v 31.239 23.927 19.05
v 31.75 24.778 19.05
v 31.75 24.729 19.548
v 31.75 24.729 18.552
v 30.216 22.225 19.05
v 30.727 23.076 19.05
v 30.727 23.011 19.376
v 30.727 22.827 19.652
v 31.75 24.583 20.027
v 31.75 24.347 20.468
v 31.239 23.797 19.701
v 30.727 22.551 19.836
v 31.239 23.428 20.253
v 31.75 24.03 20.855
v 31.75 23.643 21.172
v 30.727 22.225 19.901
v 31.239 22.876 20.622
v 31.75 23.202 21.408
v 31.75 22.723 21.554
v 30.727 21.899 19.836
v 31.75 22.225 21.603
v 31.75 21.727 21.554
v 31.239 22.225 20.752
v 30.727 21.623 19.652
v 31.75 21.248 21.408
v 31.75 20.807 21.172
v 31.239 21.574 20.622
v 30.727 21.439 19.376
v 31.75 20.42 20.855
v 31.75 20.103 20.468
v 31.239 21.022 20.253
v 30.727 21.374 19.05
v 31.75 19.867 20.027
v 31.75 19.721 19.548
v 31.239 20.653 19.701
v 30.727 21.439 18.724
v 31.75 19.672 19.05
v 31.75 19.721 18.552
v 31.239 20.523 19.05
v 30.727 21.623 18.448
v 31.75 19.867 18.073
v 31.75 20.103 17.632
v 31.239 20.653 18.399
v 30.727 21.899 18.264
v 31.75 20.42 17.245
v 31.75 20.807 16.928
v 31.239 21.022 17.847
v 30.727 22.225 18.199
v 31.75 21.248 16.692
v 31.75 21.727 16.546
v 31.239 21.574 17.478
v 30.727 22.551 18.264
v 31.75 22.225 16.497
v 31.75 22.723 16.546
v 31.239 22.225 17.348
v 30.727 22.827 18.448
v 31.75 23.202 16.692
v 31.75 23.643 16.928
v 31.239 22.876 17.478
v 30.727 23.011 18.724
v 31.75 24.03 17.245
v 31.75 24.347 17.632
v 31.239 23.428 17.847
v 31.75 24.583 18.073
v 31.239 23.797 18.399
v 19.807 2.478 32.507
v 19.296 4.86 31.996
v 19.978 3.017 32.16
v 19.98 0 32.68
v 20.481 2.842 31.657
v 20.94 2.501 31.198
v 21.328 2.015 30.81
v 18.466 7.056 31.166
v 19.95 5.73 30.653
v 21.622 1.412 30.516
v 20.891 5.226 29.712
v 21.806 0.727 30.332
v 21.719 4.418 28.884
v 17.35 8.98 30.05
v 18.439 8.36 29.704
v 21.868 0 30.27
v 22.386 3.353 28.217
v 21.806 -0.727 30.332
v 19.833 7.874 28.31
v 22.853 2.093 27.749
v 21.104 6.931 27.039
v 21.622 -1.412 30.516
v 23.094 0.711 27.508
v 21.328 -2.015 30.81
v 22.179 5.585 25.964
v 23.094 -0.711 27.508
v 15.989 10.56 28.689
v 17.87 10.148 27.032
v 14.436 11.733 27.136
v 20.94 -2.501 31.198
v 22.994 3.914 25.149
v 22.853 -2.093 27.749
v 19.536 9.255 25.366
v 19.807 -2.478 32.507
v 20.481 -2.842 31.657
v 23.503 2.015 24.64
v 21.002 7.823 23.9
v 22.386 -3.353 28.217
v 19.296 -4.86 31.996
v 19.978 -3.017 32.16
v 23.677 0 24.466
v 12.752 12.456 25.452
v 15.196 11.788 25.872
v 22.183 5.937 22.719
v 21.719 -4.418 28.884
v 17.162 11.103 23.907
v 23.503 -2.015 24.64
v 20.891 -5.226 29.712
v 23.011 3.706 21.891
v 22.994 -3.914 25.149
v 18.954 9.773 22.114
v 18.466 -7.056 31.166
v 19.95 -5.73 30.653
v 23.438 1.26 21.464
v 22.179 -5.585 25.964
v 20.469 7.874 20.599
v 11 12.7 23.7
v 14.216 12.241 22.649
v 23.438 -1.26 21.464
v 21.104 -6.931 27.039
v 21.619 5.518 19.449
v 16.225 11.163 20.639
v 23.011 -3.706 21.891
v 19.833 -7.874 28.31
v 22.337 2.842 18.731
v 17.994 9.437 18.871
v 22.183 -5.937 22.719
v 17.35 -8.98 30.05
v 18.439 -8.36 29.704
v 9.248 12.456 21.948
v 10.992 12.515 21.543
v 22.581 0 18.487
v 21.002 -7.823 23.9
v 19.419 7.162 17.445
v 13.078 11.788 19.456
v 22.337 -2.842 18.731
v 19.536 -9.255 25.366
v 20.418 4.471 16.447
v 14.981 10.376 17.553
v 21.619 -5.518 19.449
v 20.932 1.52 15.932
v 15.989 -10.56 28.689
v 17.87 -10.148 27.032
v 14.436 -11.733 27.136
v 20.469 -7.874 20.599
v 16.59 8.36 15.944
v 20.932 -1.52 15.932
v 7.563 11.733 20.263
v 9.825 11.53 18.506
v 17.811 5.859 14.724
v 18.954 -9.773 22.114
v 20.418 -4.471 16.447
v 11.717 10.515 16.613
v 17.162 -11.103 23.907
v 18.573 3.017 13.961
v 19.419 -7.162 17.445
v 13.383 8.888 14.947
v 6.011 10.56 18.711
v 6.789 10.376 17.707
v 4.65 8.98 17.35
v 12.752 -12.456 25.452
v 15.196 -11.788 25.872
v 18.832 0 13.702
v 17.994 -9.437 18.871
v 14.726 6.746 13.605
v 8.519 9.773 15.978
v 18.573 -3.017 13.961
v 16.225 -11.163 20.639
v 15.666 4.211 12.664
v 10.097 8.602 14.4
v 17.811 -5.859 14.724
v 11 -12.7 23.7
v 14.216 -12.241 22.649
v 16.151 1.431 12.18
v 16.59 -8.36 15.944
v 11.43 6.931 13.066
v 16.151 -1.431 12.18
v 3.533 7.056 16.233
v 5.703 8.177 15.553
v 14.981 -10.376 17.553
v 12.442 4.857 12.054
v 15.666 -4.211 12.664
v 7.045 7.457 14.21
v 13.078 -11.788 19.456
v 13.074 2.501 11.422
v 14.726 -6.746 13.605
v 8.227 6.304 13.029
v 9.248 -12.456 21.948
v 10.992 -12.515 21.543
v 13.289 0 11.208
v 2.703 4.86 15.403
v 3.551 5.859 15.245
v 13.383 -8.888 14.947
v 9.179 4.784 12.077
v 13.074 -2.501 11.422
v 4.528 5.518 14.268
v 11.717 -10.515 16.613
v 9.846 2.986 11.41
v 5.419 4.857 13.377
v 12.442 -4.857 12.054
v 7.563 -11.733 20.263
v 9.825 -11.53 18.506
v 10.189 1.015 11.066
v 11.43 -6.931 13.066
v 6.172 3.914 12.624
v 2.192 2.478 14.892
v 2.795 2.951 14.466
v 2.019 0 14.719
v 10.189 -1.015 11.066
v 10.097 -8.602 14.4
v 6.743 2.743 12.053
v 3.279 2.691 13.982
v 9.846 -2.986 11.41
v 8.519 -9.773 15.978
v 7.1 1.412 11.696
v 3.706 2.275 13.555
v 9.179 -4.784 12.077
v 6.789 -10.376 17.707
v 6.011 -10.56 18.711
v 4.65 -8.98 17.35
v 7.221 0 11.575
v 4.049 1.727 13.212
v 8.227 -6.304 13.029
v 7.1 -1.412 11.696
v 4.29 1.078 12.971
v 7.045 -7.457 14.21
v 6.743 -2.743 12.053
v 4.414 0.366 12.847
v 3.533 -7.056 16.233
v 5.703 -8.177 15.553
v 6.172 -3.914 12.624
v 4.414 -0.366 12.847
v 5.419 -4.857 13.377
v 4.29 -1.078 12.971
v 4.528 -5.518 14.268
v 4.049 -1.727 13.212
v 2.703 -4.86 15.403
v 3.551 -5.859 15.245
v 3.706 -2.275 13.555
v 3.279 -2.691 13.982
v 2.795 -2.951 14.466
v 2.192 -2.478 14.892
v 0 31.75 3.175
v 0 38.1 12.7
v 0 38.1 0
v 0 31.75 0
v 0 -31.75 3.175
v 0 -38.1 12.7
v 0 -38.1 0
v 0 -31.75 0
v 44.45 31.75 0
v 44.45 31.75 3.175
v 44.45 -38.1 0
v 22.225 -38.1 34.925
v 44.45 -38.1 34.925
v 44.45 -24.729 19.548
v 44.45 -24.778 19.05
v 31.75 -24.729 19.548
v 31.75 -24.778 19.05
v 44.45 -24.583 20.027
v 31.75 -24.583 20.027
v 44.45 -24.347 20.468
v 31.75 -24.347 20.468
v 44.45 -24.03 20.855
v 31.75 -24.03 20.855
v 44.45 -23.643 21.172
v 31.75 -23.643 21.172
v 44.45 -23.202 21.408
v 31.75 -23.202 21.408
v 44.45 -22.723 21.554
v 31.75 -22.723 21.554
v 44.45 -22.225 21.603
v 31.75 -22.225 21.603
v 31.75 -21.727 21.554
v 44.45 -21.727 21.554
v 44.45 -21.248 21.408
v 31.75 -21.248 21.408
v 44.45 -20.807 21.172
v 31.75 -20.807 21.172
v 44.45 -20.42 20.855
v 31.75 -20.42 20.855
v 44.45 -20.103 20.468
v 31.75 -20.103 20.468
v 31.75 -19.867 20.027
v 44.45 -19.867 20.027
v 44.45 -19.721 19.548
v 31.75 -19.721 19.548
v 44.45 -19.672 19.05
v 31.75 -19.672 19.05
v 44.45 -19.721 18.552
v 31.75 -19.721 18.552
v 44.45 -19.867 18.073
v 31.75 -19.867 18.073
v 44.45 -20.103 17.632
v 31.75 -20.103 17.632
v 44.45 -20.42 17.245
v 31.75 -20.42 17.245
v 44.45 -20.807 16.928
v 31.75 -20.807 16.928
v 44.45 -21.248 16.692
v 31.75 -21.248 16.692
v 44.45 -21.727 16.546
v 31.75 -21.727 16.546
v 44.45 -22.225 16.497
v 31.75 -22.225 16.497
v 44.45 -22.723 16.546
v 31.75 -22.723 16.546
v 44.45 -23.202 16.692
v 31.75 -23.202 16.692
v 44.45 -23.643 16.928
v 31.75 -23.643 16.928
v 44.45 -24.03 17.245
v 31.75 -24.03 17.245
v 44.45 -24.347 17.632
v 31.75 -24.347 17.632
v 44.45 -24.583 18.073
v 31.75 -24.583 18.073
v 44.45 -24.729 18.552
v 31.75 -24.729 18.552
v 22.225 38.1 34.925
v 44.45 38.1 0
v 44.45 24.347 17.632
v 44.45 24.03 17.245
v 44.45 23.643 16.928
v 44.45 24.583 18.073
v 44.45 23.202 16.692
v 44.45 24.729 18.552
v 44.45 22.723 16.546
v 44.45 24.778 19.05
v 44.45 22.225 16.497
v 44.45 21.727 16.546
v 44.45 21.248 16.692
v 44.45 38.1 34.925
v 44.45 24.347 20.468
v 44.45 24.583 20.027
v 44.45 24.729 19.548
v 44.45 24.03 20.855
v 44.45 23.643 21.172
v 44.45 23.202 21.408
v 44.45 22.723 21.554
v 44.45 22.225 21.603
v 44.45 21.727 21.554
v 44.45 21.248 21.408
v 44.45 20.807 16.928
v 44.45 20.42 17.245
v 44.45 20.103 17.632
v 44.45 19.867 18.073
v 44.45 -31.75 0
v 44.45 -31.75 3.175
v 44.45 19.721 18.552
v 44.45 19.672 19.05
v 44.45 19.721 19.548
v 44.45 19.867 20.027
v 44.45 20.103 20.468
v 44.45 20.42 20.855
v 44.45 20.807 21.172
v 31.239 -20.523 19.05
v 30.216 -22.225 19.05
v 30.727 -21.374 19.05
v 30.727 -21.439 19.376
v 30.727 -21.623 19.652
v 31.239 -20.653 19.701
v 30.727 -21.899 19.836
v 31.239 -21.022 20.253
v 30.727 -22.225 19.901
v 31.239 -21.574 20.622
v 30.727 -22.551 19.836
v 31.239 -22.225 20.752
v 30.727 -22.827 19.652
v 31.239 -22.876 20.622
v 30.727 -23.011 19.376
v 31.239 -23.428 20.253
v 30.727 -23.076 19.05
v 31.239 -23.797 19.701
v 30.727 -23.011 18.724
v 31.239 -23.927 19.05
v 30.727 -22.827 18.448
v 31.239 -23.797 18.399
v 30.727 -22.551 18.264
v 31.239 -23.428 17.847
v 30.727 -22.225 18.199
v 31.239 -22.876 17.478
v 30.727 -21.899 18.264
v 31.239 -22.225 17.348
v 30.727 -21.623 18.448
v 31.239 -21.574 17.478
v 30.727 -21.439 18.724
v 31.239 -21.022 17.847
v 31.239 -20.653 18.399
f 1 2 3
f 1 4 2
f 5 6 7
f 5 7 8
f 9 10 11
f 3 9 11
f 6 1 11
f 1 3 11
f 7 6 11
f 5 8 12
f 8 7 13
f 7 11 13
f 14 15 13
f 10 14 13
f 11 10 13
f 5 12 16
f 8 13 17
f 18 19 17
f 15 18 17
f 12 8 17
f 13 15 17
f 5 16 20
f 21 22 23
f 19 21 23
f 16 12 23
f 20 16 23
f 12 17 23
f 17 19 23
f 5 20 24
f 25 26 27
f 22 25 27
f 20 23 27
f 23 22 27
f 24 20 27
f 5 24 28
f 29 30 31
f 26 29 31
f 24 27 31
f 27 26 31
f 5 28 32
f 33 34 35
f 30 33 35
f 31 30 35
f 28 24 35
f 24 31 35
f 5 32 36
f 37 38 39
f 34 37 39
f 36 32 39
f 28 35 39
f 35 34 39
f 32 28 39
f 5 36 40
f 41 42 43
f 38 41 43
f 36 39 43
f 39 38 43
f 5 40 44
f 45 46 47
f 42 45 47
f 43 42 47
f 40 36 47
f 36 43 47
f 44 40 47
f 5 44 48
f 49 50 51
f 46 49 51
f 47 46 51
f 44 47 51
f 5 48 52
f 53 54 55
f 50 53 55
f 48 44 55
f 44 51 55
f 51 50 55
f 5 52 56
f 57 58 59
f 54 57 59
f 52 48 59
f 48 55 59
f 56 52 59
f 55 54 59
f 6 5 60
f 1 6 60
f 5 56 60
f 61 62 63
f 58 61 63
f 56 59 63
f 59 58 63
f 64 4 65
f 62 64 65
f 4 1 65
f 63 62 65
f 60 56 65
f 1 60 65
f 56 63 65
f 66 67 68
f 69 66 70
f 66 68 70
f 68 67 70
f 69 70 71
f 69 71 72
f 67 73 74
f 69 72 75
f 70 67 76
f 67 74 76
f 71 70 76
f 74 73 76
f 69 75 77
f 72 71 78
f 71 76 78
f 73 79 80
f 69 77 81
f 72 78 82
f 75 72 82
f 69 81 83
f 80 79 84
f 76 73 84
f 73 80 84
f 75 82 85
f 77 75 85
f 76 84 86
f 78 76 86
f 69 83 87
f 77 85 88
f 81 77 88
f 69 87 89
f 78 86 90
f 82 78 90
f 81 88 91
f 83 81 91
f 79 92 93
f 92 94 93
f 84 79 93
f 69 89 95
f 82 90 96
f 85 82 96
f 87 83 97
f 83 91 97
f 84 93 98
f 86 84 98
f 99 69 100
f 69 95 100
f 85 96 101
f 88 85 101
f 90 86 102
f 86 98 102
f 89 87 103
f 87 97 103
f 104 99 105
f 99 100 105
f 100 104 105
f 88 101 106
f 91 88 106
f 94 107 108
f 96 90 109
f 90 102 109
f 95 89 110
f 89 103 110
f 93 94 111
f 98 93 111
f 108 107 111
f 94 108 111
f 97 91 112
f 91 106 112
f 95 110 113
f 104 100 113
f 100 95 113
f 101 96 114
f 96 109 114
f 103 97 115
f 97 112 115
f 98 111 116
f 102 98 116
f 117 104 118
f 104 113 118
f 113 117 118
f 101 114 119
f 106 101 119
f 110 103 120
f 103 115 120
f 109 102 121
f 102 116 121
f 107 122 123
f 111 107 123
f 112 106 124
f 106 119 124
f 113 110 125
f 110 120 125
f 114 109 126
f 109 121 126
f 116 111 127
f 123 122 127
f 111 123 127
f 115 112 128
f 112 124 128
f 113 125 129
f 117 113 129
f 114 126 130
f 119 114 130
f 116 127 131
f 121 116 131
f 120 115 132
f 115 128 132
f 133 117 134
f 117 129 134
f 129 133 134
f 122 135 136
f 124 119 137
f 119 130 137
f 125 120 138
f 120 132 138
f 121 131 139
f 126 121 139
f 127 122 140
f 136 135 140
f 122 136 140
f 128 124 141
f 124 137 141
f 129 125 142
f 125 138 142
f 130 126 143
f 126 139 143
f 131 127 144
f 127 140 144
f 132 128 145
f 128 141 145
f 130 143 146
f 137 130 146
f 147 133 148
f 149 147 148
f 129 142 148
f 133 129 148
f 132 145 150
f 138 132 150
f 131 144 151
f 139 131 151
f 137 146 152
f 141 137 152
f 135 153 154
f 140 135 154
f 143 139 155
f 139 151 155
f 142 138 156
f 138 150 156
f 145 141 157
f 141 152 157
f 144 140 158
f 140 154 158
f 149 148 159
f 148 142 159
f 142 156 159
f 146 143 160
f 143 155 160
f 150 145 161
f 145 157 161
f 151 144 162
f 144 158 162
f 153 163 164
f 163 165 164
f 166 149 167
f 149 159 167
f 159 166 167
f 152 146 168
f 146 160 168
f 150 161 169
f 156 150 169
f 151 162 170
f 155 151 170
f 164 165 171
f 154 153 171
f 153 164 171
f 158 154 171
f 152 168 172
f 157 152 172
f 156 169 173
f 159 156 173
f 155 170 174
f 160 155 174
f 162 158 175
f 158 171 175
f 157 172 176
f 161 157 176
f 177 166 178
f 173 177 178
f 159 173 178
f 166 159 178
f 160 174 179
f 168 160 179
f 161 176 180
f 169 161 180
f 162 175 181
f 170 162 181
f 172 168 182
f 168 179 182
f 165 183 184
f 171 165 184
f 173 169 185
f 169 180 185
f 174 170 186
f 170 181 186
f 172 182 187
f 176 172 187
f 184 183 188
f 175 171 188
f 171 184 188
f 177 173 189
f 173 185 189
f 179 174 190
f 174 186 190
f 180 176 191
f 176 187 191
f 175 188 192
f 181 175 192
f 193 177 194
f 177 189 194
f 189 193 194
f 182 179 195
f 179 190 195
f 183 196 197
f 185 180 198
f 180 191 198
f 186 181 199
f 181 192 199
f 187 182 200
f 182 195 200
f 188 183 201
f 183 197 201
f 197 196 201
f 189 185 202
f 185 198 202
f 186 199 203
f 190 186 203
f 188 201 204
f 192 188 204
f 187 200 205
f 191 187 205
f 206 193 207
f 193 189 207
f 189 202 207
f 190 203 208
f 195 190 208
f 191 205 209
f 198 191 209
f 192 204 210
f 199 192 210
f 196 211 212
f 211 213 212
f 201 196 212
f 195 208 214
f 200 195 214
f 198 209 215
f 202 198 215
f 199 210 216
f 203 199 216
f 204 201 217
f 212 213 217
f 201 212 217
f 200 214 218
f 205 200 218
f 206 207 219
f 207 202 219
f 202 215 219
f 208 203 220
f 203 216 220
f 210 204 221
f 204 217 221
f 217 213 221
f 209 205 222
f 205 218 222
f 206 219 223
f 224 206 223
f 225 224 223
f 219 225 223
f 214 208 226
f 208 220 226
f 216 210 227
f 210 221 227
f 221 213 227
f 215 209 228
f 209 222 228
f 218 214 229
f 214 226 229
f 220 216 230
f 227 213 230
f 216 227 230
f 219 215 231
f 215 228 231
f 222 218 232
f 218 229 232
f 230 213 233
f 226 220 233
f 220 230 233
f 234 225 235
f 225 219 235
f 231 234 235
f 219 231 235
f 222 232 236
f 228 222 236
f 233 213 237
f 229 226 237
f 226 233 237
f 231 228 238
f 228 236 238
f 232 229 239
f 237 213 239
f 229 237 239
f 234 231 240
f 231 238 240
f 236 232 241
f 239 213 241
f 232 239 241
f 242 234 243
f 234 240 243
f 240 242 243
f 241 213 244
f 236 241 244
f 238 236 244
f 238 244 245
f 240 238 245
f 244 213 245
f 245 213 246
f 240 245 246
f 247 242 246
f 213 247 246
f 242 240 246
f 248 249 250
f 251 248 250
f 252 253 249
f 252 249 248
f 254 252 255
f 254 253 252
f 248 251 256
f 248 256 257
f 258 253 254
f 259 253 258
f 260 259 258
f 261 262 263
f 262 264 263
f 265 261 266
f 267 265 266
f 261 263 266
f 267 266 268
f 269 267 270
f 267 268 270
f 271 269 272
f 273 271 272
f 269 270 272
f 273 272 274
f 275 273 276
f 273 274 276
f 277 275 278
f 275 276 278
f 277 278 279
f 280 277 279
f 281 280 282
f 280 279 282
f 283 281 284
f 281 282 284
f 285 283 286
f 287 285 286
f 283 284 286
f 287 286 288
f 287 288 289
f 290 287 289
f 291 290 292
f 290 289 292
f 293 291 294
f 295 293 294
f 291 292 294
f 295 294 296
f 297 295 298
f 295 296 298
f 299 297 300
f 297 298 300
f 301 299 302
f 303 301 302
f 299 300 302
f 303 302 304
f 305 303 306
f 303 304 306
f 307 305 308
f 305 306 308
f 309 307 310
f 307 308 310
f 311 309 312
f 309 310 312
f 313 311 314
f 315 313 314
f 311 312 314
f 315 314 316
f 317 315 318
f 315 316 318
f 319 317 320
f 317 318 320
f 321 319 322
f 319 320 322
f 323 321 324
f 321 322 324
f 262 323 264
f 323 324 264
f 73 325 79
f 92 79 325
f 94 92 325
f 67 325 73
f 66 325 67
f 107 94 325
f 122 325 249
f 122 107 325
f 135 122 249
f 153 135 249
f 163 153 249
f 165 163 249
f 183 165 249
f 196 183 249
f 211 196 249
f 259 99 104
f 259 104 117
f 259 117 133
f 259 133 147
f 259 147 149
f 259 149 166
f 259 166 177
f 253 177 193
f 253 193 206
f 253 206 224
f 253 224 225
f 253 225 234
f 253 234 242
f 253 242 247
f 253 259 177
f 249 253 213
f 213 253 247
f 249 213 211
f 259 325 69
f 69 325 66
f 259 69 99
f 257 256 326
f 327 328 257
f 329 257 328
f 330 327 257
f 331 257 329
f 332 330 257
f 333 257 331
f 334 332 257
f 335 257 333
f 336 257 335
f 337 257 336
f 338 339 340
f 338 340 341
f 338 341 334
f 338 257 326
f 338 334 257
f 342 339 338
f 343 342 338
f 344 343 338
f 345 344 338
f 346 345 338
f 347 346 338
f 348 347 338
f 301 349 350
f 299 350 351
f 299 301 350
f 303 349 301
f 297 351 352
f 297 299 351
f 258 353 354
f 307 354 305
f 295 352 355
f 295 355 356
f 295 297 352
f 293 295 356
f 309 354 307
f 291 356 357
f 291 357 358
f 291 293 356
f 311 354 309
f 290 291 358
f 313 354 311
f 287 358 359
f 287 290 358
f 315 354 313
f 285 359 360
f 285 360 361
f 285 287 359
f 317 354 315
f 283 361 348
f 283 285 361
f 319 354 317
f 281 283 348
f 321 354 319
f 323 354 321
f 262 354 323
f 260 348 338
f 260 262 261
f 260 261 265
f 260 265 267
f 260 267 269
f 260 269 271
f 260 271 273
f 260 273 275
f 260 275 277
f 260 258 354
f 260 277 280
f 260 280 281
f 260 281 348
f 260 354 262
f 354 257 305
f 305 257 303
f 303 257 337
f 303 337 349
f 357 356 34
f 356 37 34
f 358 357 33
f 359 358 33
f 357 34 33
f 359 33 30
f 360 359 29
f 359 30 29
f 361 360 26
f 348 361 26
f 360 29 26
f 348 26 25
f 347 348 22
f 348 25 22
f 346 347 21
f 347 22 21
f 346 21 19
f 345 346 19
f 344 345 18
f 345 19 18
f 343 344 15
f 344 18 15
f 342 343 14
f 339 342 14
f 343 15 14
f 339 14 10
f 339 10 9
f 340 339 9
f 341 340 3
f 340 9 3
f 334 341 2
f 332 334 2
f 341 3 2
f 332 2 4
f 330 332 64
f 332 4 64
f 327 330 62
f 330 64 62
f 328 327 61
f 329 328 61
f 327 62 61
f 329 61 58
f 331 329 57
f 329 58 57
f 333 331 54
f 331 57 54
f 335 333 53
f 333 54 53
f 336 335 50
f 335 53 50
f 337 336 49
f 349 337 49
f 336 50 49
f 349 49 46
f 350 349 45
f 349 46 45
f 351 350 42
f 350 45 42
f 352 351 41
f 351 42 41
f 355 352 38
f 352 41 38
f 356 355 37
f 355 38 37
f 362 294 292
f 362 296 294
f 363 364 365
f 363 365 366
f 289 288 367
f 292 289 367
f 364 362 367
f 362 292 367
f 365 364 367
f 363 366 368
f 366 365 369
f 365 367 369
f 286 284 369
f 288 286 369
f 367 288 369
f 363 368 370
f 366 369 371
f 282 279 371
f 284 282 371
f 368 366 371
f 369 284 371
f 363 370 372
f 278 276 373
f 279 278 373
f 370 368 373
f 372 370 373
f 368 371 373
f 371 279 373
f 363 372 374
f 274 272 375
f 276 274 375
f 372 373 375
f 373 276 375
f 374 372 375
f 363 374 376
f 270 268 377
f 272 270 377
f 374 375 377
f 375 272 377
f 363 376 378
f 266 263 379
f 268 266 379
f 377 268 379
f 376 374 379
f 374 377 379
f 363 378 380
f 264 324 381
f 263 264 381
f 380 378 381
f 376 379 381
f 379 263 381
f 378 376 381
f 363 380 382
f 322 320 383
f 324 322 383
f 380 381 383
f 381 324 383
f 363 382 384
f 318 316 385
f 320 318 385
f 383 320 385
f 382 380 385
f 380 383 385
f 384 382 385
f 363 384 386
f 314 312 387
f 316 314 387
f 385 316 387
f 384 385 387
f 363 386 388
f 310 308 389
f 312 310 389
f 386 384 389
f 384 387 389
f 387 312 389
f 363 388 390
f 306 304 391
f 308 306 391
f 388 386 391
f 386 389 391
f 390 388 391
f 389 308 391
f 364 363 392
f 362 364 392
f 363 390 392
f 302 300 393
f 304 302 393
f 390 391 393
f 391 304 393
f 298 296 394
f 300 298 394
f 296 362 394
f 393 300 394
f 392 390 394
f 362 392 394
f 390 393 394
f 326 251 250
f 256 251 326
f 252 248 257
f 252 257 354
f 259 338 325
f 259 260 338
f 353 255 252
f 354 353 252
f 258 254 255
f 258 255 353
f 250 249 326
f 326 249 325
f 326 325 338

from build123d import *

# Parameters (mm, degrees)
F1_DEPTH = 38.1
F2_W     = 63.5
F2_H     = 3.175
F3_DEPTH = 44.451
F5_D     = 5.1054
F5_DEPTH = 12.7
F5_TIP   = 1.5338169022
F7_ANGLE = 180


with BuildPart() as f1:
    # F0 (on Front) → F1 (new body, symmetric)
    with BuildSketch(Plane.XZ):
        Polygon((0, 12.7), (0, 0), (44.45, 0), (44.45, 34.925), (22.225, 34.925), align=None)
    extrude(amount=F1_DEPTH, both=True)

    # F2 (on face) → F3 (cut, through all)
    with BuildSketch(Plane(origin=(0, 0, 0), x_dir=(0, -1, 0), z_dir=(-1, 0, 0))):
        with Locations((0, 1.5875)):
            Rectangle(F2_W, F2_H)
    extrude(amount=-F3_DEPTH, mode=Mode.SUBTRACT)

    # F5
    with Locations(Plane.YZ.offset(44.45)):
        with Locations((-22.225, 19.05), (22.225, 19.05)):
            Hole(F5_D / 2, depth=F5_DEPTH)
            with Locations((0, 0, -(F5_DEPTH + F5_TIP / 2))):  # 118° drill point
                Cone(0, F5_D / 2, F5_TIP, mode=Mode.SUBTRACT)

    # F6 (on face) → F7 (revolve, cut)
    with BuildSketch(Plane(origin=(-6.35, 0, 6.35), x_dir=(0, -1, 0), z_dir=(-0.7071067812, 0, 0.7071067812))):
        with BuildLine():
            Line((0, 11.8361525448), (0, 37.2361525448))
            ThreePointArc((0, 37.2361525448), (-12.7, 24.5361525448), (0, 11.8361525448))
        make_face()
    revolve(axis=Axis((10.9996798487, 0, 23.6996798487), (-0.7071067812, 0, -0.7071067812)), revolution_arc=F7_ANGLE, mode=Mode.SUBTRACT)


solid = f1.part
